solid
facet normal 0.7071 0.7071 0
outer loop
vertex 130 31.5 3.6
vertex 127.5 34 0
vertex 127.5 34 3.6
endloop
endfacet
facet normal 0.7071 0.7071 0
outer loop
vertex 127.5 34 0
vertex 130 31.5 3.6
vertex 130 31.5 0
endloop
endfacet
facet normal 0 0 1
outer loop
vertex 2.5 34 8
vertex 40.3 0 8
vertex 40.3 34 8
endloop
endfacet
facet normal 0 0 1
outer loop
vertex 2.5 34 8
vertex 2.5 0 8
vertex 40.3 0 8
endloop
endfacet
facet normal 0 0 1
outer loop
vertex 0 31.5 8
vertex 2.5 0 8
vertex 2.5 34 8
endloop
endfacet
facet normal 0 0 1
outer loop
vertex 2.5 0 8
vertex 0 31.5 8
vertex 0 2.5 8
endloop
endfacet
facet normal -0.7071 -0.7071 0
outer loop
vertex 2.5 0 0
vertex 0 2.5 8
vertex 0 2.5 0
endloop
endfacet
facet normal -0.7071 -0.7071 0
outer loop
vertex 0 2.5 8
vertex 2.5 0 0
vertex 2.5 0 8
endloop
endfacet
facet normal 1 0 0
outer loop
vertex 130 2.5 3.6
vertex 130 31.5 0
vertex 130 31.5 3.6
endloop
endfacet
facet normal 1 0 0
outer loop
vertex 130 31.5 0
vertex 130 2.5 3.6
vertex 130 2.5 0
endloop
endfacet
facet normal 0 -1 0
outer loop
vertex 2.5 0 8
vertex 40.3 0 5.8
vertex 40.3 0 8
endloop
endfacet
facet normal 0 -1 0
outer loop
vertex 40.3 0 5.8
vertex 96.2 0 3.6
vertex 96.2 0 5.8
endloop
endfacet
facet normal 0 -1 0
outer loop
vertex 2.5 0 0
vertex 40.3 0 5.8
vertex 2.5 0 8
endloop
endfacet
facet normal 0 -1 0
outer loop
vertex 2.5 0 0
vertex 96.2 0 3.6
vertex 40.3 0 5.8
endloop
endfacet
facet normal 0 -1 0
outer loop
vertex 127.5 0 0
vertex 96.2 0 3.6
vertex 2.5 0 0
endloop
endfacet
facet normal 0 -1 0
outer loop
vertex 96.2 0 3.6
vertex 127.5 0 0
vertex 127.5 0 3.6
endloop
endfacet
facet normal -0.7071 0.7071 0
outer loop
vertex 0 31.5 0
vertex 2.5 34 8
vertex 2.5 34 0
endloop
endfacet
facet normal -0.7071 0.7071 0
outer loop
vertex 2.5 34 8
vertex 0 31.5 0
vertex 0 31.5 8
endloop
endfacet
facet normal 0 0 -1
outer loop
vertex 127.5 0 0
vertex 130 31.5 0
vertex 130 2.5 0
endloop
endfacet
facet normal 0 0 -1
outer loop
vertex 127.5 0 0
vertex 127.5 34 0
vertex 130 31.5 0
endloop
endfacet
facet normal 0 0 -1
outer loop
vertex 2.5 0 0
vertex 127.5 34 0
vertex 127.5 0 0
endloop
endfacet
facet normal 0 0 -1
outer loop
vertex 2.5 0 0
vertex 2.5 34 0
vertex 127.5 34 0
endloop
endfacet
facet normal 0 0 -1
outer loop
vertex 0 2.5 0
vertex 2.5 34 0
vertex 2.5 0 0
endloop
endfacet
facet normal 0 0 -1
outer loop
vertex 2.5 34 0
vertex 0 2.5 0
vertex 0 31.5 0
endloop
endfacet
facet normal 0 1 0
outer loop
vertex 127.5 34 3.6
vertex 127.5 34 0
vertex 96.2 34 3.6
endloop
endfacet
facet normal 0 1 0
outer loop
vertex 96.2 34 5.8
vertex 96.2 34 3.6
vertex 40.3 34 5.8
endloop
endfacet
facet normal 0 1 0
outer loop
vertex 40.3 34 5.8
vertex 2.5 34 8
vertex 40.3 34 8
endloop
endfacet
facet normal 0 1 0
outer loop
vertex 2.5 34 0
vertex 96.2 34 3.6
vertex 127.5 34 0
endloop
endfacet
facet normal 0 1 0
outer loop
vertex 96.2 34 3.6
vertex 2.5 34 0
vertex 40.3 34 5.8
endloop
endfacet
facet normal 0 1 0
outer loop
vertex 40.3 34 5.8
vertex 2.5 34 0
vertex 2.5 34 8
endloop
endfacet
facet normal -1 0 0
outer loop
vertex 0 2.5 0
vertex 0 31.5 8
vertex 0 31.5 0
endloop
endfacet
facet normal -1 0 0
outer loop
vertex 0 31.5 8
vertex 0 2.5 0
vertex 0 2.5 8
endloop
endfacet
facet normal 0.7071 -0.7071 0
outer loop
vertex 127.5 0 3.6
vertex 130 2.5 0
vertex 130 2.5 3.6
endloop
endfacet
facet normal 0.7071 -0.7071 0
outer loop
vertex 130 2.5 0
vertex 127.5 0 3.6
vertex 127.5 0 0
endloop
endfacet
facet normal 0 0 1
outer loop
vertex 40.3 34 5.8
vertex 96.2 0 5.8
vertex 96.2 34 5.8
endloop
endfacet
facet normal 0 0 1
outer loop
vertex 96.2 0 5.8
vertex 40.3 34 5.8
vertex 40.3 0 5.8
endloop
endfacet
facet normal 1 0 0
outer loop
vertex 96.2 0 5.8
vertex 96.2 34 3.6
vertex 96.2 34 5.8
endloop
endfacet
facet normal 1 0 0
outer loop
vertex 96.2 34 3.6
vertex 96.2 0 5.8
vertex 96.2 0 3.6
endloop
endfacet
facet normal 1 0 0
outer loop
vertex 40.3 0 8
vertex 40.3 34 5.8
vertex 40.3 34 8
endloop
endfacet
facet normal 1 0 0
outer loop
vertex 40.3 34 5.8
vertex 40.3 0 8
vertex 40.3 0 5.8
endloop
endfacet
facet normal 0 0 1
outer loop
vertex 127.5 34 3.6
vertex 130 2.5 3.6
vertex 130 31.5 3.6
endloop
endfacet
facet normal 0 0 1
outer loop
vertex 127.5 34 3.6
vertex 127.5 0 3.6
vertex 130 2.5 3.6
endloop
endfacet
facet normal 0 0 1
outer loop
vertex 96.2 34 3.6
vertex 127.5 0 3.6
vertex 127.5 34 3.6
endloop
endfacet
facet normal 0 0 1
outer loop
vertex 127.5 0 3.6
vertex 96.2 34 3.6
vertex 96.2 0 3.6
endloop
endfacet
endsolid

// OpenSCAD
$fn = 32;

// ----------------------------------------------------------------------
// Stepped bar: twostep, 130 x 34 x 8/3.6 mm
// ----------------------------------------------------------------------

// --- parameters (mm) ---
bar_l = 130;              // bar length, X
bar_w = 34;               // bar width, Y
plate_t = 8;              // thickness of the thick zone, Z
thin_t = 3.6;             // thickness of the thin zone
corner_c = 2.5;           // corner chamfer of the bar
step_cut = 4.4;           // material removed from the thin zone
stair1_x = 40.3;          // position of the first stair
stair2_x = 96.2;          // position of the second stair
mid_t = 5.8;              // thickness of the middle zone
depth_1 = 2.2;            // depth of cut 1 from the top face
depth_2 = 4.4;            // depth of cut 2 from the top face

profile = [[2.5, 0], [127.5, 0], [130, 2.5], [130, 31.5], [127.5, 34], [2.5, 34], [0, 31.5], [0, 2.5]];  // primary outline, 8 points, counter clockwise
void_1 = [[40.3, -1], [96.2, -1], [96.2, 35], [40.3, 35]];  // first stair, 4 points
void_2 = [[96.2, -1], [131, -1], [131, 35], [96.2, 35]];  // second stair, 4 points

// --- the one profile operation ---
difference() {
  linear_extrude(height = plate_t) polygon(points = profile);
  translate([0, 0, plate_t - depth_1])
    linear_extrude(height = depth_1 + 1) polygon(points = void_1);
  translate([0, 0, plate_t - depth_2])
    linear_extrude(height = depth_2 + 1) polygon(points = void_2);
}
